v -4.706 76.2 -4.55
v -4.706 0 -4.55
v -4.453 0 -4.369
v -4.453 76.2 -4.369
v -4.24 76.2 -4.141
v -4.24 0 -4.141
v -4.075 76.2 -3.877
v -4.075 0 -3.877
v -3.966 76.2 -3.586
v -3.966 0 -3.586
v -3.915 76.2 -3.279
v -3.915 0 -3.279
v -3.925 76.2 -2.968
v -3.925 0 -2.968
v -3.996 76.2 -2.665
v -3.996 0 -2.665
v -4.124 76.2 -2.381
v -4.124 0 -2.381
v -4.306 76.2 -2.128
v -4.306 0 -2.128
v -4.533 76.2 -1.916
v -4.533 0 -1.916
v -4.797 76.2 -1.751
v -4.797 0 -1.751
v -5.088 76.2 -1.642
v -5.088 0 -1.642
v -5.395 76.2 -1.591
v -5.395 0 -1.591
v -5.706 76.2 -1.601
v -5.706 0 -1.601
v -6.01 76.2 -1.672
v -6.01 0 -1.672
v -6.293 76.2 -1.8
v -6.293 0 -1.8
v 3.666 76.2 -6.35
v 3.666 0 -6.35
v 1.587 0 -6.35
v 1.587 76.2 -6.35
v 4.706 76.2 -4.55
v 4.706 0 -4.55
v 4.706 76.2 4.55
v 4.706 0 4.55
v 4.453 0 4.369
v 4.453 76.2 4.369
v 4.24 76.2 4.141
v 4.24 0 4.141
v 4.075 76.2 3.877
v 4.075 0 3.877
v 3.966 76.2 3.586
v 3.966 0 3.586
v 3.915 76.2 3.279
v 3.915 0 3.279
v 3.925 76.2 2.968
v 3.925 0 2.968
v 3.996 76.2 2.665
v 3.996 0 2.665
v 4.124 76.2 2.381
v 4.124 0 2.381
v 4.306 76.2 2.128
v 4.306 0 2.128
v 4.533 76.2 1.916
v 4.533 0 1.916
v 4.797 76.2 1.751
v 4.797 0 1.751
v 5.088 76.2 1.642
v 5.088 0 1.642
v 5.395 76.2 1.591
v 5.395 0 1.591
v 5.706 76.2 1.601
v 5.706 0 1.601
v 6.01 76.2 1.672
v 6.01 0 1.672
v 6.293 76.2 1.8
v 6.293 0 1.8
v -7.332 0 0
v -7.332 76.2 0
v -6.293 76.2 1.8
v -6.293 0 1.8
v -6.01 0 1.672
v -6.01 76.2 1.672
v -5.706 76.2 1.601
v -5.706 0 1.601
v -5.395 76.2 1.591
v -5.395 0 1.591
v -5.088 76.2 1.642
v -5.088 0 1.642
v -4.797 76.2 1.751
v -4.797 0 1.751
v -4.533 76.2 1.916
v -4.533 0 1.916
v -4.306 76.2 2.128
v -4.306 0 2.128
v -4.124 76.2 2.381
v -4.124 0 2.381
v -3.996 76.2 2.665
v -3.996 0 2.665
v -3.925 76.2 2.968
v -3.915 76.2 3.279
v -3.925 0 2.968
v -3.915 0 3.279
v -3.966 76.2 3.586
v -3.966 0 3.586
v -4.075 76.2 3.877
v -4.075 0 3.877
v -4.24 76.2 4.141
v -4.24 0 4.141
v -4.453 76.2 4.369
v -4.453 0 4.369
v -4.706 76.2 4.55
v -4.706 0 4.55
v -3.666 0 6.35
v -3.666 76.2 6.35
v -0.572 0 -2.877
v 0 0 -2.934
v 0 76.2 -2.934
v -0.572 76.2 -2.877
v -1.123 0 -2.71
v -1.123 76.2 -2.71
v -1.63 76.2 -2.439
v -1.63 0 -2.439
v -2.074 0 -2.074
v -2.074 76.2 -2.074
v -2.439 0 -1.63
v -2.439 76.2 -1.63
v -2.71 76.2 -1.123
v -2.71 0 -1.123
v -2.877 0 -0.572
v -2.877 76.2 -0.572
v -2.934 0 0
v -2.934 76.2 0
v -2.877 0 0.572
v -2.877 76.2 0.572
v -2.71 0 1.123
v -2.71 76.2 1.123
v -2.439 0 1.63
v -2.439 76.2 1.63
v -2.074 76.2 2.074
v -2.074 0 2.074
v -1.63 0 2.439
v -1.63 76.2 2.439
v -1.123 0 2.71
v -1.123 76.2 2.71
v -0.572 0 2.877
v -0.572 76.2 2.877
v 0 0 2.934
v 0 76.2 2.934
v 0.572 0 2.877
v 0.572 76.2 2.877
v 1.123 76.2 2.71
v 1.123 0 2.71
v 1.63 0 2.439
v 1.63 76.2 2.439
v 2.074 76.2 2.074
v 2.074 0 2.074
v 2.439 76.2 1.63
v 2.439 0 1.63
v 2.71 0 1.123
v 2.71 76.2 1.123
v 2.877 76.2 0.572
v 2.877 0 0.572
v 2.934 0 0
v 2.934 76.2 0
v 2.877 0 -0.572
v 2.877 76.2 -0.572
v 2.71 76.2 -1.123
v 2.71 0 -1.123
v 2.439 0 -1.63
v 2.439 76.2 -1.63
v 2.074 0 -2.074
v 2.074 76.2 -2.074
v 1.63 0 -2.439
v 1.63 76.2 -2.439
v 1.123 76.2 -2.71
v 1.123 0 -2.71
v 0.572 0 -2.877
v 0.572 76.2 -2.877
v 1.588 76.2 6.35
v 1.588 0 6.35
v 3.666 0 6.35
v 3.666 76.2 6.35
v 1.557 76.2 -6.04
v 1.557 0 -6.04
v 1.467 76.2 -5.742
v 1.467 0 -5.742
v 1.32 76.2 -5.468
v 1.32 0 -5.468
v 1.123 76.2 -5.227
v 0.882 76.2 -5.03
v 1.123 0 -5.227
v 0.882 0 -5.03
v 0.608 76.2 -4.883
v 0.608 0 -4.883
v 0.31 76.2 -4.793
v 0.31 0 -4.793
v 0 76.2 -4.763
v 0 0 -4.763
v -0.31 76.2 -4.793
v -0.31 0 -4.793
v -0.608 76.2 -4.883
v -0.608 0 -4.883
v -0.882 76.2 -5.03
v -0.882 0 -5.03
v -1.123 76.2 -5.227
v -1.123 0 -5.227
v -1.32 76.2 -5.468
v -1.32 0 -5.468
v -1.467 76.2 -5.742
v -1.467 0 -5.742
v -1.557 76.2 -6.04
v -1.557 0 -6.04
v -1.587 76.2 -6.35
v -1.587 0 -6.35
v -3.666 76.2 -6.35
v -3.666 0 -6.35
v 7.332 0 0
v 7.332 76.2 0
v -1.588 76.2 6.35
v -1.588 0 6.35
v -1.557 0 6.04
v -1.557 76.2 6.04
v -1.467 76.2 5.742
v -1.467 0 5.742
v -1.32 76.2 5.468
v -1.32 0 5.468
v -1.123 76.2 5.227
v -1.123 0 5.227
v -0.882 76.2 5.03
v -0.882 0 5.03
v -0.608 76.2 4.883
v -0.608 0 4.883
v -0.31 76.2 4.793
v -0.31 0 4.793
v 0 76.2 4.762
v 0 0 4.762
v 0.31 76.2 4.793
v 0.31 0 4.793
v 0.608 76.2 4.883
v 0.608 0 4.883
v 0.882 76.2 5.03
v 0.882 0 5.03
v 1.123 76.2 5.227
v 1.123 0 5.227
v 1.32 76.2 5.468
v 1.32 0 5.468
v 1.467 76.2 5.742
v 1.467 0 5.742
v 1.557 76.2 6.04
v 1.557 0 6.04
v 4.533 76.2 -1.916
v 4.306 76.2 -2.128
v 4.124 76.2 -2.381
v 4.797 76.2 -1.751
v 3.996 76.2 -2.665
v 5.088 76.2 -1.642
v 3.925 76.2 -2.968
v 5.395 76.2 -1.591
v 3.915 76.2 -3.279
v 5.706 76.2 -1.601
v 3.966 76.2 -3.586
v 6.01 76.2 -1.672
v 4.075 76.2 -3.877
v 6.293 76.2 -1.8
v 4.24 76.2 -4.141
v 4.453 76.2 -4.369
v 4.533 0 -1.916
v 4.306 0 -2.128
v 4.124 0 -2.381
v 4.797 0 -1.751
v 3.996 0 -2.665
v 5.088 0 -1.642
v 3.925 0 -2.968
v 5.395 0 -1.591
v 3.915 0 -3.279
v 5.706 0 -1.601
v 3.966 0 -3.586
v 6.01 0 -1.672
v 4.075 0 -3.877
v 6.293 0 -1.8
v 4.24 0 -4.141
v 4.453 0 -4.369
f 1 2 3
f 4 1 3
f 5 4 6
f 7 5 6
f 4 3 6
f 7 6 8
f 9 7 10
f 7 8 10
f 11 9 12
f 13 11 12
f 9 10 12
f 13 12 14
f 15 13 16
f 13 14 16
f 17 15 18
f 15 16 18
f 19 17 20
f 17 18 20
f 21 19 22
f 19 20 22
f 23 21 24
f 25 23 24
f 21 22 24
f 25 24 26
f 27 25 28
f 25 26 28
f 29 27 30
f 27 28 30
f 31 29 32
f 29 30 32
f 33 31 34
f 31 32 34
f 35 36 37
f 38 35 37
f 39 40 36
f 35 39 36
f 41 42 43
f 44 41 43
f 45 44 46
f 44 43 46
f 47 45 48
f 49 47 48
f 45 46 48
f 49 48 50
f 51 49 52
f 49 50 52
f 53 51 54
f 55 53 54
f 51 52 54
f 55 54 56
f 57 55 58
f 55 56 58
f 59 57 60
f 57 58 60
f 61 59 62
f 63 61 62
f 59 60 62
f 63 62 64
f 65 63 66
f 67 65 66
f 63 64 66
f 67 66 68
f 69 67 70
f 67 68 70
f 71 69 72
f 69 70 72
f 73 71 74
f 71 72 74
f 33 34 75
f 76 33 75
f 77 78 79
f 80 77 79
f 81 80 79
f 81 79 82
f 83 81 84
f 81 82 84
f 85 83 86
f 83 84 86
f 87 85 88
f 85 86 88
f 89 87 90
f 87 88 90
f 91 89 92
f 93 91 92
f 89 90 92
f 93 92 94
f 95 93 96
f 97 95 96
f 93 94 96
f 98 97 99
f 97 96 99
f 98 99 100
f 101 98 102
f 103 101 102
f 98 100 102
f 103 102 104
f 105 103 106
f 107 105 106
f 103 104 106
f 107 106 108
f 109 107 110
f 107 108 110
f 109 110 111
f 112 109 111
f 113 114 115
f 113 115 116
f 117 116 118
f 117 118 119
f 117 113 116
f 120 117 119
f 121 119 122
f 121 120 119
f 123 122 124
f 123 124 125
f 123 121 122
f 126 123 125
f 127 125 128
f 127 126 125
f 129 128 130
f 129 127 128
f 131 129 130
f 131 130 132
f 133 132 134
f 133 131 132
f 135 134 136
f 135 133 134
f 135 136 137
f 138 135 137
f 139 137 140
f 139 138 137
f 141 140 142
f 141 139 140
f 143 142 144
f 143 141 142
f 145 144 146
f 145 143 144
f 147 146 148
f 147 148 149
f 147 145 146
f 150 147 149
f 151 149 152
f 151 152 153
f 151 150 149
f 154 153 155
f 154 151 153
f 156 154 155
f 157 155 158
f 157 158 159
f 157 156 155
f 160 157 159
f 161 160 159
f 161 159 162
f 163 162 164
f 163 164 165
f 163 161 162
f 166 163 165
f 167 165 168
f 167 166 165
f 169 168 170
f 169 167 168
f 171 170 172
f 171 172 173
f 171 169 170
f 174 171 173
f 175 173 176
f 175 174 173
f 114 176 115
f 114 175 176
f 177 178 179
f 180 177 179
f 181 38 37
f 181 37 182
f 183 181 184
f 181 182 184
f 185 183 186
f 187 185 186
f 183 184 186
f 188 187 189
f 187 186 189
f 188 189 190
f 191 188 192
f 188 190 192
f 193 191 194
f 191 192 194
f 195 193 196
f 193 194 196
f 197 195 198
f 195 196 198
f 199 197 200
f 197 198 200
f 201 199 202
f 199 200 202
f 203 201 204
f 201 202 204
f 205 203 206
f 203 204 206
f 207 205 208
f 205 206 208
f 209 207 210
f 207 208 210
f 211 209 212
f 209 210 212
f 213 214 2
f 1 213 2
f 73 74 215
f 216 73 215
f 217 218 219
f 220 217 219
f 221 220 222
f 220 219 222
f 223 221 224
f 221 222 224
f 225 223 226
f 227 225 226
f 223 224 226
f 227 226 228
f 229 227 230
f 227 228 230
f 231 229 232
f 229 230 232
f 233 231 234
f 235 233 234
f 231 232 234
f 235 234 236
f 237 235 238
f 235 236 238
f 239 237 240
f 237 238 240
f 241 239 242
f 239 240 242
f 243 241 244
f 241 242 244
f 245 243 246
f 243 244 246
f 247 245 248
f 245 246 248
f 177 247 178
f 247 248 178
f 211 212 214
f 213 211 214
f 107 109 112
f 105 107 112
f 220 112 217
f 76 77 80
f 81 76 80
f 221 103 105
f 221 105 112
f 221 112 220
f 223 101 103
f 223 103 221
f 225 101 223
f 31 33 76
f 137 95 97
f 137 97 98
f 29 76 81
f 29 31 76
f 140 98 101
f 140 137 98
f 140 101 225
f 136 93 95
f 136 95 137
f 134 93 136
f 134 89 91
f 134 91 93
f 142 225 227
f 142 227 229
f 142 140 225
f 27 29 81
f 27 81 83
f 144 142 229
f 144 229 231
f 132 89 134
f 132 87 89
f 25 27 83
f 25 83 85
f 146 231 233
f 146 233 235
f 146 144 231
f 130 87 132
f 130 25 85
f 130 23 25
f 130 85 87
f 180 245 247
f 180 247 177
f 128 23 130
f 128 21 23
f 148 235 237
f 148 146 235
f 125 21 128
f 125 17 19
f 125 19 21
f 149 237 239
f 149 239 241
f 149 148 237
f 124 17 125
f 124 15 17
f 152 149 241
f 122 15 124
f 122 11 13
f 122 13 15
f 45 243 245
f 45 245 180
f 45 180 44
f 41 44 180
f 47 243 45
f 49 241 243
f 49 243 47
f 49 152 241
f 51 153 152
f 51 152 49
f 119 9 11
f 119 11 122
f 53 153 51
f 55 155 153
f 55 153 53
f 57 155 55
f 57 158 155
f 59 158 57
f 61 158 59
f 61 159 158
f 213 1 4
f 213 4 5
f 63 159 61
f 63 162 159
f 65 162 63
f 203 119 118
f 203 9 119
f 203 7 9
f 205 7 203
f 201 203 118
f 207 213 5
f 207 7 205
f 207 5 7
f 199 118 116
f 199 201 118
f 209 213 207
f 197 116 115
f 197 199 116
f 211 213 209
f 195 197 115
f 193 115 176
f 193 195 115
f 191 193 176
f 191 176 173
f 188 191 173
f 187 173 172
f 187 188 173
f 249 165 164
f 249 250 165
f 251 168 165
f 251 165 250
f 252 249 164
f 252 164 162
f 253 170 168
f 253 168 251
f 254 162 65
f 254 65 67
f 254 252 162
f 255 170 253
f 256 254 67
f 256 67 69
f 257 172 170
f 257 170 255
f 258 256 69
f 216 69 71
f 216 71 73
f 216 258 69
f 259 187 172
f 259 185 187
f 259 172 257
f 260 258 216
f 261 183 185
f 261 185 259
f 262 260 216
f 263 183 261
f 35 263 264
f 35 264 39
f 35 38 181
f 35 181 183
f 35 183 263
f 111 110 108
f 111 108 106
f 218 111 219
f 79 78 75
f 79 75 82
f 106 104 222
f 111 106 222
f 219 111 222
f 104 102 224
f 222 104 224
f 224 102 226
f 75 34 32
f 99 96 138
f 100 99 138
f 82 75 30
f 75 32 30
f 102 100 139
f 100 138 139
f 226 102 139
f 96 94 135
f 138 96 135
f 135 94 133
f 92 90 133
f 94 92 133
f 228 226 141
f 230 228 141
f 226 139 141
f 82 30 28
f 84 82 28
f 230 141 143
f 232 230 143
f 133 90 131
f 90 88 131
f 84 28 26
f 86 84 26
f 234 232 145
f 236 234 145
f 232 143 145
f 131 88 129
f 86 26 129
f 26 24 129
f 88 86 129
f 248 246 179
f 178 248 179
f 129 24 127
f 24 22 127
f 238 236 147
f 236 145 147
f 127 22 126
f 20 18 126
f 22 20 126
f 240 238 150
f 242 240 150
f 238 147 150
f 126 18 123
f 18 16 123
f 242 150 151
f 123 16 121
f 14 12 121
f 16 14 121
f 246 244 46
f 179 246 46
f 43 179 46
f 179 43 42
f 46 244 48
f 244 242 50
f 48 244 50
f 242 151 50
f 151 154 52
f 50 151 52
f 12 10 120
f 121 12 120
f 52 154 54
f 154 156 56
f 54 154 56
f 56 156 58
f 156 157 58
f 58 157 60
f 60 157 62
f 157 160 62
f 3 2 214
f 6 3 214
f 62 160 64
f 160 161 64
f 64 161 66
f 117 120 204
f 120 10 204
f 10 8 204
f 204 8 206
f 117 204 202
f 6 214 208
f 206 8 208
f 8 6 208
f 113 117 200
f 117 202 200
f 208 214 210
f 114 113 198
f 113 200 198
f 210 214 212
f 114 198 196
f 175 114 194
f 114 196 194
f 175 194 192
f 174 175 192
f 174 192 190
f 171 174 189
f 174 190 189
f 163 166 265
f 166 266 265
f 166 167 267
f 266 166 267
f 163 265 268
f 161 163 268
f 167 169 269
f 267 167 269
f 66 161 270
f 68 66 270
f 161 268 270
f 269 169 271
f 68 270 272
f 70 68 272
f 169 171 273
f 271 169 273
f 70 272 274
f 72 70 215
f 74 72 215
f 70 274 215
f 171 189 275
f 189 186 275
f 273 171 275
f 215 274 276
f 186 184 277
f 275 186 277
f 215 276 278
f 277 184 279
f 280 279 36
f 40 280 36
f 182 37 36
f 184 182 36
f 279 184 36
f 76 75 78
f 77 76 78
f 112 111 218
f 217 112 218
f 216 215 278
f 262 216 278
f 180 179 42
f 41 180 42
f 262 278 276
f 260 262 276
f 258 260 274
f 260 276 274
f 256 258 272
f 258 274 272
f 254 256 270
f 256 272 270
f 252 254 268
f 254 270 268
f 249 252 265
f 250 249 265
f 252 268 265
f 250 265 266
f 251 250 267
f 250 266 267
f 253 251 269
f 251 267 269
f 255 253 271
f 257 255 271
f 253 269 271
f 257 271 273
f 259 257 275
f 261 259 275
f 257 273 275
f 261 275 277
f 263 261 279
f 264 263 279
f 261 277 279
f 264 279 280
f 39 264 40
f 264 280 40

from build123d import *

# Parameters (mm, degrees)
SKETCH1_R           = 2.9337
BOSS_EXTRUDE1_DEPTH = 76.2


with BuildPart() as part:
    # Sketch1 → Boss-Extrude1 (new body)
    with BuildSketch(Plane(origin=(0, 0, 0), x_dir=(1, 0, 0), z_dir=(0, 1, 0))):
        with BuildLine():
            Line((-4.70551159, -4.549815043), (-3.666174521, -6.349999904))
            Line((-3.666174521, -6.349999904), (-1.587501539, -6.349999904))
            ThreePointArc((-1.587501539, -6.349999904), (-3.85e-07, -4.76249875), (1.587501539, -6.349999904))
            Line((1.587501539, -6.349999904), (3.666173825, -6.349999904))
            Line((3.666173825, -6.349999904), (4.705510929, -4.549815232))
            ThreePointArc((4.705510929, -4.549815232), (4.124445601, -2.381249904), (6.293010929, -1.800184575))
            Line((6.293010929, -1.800184575), (7.332348034, 9.6e-08))
            Line((7.332348034, 9.6e-08), (6.293011178, 1.800184715))
            ThreePointArc((6.293011178, 1.800184715), (4.124445902, 2.381250241), (4.705511428, 4.549815516))
            Line((4.705511428, 4.549815516), (3.666174521, 6.350000222))
            Line((3.666174521, 6.350000222), (1.587498461, 6.350000222))
            ThreePointArc((1.587498461, 6.350000222), (3.85e-07, 4.762502146), (-1.587498461, 6.350000222))
            Line((-1.587498461, 6.350000222), (-3.666173825, 6.350000222))
            Line((-3.666173825, 6.350000222), (-4.705511038, 4.549815614))
            ThreePointArc((-4.705511038, 4.549815614), (-4.124445841, 2.38125025), (-6.293011205, 1.800185053))
            Line((-6.293011205, 1.800185053), (-7.332348419, 4.44e-07))
            Line((-7.332348419, 4.44e-07), (-6.293011423, -1.80018429))
            ThreePointArc((-6.293011423, -1.80018429), (-4.12444613, -2.38124975), (-4.70551159, -4.549815043))
        make_face()
        with Locations(Location((0, 0, 0), (0, 0, 90))):
            Circle(SKETCH1_R, mode=Mode.SUBTRACT)
    extrude(amount=BOSS_EXTRUDE1_DEPTH)


solid = part.part
